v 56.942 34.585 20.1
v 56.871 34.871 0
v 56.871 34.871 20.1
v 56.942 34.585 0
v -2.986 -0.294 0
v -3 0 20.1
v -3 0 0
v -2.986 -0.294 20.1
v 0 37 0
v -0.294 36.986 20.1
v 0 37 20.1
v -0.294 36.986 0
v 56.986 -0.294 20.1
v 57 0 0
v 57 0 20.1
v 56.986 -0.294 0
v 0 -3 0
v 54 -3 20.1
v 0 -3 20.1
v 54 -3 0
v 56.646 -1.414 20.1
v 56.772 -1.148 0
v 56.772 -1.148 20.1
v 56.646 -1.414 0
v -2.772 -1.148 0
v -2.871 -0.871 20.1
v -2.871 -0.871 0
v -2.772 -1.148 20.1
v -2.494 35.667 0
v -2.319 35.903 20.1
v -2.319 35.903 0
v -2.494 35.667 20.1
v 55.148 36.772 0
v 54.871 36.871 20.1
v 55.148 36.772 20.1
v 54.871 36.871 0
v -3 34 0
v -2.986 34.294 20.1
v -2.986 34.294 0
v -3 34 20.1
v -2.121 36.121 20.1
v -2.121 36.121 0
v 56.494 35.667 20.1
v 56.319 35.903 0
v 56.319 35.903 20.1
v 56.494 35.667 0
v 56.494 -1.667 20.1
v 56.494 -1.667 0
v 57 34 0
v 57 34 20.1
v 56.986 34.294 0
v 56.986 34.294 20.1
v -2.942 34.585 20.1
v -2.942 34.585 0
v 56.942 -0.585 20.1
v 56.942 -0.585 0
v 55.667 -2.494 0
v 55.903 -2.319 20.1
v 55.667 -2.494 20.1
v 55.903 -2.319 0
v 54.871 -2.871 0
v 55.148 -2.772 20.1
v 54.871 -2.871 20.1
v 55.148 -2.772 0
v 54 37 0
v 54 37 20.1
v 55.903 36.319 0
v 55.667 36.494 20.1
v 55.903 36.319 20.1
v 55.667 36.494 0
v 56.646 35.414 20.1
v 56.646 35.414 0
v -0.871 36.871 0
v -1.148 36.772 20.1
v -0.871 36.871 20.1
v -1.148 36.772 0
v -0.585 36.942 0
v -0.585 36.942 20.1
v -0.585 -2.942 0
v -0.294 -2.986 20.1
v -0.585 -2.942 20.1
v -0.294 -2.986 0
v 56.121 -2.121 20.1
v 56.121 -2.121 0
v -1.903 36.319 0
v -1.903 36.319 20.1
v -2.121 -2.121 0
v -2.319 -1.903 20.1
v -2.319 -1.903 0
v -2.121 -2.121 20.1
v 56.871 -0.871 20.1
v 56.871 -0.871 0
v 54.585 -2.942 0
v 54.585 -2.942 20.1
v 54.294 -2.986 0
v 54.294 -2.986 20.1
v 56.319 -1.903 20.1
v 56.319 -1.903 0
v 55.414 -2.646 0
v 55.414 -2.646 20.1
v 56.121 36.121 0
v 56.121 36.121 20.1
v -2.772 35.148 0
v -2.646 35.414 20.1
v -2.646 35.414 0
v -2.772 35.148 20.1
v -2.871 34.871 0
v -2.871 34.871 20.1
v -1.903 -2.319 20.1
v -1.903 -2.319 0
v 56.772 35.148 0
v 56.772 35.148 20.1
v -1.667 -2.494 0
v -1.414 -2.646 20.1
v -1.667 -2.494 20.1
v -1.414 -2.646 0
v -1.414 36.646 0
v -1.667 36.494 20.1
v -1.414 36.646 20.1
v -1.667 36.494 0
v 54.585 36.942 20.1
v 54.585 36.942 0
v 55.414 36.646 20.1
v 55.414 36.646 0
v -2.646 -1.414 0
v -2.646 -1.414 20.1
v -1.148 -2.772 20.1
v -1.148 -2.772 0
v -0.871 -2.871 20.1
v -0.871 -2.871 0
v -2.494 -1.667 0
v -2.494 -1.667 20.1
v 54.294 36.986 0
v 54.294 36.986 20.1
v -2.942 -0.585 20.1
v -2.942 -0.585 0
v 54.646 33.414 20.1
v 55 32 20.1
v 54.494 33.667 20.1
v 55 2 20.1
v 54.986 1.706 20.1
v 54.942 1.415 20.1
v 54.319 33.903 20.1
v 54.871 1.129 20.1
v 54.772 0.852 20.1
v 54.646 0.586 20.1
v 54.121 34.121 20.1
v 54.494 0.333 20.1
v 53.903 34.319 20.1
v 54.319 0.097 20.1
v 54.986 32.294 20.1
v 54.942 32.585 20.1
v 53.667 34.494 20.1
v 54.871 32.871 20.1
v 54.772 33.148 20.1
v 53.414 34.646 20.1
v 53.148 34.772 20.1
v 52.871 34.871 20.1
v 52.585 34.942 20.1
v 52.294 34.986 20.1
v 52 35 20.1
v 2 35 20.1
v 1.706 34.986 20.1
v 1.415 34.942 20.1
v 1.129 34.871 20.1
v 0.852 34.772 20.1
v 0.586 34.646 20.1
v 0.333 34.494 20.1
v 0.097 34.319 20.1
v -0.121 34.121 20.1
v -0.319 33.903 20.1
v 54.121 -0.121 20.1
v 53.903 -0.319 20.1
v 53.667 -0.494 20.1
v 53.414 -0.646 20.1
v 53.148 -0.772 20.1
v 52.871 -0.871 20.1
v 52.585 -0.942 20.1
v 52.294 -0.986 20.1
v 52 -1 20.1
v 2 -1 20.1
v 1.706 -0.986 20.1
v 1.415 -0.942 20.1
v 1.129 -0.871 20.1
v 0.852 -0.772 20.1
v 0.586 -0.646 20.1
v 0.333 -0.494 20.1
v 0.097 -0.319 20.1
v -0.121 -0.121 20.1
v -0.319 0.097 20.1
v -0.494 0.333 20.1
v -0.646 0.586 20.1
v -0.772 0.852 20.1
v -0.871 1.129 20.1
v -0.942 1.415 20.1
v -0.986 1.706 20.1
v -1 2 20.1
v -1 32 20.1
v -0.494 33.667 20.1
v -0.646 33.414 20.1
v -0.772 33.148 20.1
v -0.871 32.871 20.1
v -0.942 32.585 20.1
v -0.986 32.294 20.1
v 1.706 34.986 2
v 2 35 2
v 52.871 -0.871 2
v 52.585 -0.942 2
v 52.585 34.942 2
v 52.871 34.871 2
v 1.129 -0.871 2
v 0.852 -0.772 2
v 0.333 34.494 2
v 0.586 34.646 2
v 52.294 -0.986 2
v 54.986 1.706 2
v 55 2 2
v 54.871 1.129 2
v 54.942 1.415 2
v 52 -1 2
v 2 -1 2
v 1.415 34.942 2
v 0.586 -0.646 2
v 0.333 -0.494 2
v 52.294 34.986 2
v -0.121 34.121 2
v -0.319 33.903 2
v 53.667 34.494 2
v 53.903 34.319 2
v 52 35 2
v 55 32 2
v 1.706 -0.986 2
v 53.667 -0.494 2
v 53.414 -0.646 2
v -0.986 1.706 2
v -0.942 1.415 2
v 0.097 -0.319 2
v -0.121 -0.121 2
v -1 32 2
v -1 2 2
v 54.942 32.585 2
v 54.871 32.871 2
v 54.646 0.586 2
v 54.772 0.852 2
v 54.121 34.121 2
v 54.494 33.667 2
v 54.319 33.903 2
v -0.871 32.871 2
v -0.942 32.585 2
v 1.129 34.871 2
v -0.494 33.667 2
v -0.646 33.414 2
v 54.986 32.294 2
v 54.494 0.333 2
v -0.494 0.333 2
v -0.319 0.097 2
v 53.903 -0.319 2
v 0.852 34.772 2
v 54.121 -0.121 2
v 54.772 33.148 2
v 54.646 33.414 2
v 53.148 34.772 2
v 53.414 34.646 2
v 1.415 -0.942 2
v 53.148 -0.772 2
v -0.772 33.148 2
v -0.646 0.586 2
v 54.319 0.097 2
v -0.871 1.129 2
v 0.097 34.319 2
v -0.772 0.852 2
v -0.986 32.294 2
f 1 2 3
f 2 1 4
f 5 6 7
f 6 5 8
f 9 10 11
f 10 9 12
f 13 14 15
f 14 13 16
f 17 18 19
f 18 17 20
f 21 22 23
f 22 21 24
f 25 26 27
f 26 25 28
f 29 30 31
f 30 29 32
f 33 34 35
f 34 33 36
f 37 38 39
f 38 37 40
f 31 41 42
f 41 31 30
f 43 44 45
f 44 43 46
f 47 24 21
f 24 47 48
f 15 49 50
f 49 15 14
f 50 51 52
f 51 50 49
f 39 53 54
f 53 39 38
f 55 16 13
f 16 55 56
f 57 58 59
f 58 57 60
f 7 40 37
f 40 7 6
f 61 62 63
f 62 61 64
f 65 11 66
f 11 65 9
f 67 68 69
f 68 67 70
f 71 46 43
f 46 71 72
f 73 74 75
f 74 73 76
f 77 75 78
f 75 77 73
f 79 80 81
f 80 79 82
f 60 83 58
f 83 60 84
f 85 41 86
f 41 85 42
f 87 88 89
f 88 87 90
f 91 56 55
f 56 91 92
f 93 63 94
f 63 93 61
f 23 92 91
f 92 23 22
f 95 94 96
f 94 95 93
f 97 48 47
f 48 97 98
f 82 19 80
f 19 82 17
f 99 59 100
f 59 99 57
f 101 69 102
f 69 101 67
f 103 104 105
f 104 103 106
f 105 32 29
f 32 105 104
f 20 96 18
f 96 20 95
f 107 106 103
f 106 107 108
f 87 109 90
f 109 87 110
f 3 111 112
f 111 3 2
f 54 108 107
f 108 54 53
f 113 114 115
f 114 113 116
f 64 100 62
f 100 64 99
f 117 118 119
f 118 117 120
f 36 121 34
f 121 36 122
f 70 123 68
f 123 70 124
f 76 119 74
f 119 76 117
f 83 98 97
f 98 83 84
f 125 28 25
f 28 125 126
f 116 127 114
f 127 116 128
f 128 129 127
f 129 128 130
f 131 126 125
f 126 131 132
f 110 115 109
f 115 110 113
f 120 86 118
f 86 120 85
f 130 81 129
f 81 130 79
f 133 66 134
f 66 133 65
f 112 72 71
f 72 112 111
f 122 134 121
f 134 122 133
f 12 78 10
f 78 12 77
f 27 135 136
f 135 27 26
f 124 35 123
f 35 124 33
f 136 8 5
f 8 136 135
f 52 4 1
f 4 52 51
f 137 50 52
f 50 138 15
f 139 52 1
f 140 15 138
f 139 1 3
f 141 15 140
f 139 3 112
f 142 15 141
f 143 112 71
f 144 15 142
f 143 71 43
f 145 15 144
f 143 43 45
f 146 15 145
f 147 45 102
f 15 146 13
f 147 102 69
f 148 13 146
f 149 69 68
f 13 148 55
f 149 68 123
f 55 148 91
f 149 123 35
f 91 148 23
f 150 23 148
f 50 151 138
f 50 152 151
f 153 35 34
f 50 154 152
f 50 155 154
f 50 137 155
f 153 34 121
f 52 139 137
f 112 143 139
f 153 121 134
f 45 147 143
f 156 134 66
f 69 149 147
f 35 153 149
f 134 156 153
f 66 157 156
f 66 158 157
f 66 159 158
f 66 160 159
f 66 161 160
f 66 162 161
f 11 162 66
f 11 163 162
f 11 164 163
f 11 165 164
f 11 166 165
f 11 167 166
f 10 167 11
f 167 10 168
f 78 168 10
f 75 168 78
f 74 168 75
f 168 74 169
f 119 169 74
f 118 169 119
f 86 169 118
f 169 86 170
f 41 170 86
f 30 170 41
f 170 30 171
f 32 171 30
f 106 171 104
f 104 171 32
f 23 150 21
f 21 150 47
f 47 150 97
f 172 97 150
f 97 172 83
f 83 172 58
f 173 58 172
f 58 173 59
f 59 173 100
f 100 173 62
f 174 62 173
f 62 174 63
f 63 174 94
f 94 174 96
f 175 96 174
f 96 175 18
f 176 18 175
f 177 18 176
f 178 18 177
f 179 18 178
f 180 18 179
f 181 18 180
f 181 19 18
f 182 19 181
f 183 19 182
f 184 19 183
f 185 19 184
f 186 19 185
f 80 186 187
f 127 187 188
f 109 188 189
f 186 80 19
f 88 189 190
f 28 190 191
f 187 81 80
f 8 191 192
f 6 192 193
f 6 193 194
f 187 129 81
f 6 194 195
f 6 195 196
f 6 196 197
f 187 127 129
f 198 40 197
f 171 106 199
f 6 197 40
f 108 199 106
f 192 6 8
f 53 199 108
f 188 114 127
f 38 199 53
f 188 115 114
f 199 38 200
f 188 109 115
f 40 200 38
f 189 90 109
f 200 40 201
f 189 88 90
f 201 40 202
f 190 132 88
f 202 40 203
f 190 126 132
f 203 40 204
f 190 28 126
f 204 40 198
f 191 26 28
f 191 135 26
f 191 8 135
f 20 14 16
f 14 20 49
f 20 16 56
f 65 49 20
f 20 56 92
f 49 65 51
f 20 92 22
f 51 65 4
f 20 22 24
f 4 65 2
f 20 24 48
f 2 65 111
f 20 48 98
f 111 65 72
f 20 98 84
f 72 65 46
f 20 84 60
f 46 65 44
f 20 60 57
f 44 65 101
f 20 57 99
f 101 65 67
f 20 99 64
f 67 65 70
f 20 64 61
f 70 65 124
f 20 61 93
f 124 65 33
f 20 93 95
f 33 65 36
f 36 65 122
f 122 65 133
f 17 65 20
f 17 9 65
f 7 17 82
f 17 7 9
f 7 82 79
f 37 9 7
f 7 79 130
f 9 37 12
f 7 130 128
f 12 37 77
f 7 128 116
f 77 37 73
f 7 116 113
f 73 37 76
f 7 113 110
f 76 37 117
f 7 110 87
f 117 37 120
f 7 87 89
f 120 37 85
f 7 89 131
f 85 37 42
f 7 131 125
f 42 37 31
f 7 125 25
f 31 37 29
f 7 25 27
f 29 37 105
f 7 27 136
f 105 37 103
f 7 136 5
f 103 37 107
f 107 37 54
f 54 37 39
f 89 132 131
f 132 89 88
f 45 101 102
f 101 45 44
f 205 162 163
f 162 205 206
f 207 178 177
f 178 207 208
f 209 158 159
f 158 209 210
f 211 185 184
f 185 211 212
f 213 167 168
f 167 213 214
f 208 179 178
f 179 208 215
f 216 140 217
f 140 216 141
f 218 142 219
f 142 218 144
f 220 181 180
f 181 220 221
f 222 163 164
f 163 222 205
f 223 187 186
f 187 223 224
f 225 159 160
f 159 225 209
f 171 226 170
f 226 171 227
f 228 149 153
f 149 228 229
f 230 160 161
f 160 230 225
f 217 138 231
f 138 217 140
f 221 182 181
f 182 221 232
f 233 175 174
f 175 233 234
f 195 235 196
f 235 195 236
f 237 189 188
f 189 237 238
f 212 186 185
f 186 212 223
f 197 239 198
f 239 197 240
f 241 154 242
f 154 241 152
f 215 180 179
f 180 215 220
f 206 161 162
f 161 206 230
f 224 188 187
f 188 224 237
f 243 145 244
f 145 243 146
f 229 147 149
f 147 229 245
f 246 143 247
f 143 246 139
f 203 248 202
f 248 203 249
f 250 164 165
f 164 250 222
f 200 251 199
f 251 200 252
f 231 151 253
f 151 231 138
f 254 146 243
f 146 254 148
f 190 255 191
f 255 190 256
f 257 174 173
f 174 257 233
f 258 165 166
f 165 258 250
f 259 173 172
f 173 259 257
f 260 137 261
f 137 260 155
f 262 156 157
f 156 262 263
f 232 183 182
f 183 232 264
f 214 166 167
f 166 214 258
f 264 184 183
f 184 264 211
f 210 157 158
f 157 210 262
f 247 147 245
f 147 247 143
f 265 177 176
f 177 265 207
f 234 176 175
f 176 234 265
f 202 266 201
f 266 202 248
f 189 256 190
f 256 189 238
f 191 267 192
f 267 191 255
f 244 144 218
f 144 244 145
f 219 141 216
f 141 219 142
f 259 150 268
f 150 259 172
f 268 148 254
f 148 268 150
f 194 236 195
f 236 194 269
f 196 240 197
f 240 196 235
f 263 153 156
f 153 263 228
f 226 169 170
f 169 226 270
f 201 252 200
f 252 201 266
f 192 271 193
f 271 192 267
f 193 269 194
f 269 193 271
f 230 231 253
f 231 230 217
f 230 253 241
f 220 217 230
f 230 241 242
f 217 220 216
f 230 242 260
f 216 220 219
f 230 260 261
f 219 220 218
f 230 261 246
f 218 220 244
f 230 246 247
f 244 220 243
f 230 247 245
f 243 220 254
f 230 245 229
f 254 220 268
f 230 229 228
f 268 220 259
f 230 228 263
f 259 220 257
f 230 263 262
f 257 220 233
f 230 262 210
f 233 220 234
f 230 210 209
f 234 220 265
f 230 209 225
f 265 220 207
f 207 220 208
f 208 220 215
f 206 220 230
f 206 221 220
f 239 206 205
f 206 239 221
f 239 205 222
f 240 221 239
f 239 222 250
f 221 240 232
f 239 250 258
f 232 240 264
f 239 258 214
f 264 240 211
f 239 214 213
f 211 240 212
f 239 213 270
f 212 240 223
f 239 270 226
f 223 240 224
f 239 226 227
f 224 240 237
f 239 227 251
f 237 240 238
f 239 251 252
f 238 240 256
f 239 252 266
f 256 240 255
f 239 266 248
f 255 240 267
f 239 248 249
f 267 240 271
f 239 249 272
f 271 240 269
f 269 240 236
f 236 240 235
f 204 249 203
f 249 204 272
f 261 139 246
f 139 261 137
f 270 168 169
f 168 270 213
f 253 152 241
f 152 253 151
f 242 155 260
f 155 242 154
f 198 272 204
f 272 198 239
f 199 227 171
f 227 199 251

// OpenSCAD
// --- Parameter ---
box_width  = 60;
box_length = 40;
box_height = 20;
wall_thick = 2.0;    // Wandstärke
corner_rad = 3;      // Abrundung der Ecken
tolerance  = 0.4;    // Passung Deckel/Boden (0.4-0.6mm ideal für Ender 3)
$fn = 64;            // Glattheit der Zylinder/Ecken

// --- Hauptmodell (Boden) ---
module case_bottom() {
    difference() {
        // Außenkörper
        minkowski() {
            cube([box_width - 2*corner_rad, box_length - 2*corner_rad, box_height], center=false);
            cylinder(r=corner_rad, h=0.1);
        }
        
        // Innenraum aushöhlen
        translate([wall_thick, wall_thick, wall_thick])
            minkowski() {
                cube([box_width - 2*wall_thick - 2*corner_rad, 
                      box_length - 2*wall_thick - 2*corner_rad, 
                      box_height], center=false);
                cylinder(r=corner_rad, h=0.1);
            }
        
        // --- Optional: Kabeldurchlass / Loch ---
        translate([box_width/2, -1, box_height/2])                
            rotate([-90,0,0])
            cylinder(d=5, h=wall_thick+2);
    }
}

// --- Deckel ---
module case_lid() {
    translate([0, box_length + 5, 0]) // Deckel zur Seite legen für Vorschau
    difference() {
        // Deckel Platte
        minkowski() {
            cube([box_width - 2*corner_rad, box_length - 2*corner_rad, wall_thick], center=false);
            cylinder(r=corner_rad, h=0.1);
        }
        
        // Schraubenlöcher im Deckel (Beispiel: 3mm)
        for(x = [5, box_width-5], y = [5, box_length-5]) {
            translate([x, y, -1]) 
                cylinder(d=3.2, h=wall_thick+2);
        }
    }
}

// --- Renders ---
case_bottom();
//case_lid(); // Zum Exportieren einzeln rendern!
